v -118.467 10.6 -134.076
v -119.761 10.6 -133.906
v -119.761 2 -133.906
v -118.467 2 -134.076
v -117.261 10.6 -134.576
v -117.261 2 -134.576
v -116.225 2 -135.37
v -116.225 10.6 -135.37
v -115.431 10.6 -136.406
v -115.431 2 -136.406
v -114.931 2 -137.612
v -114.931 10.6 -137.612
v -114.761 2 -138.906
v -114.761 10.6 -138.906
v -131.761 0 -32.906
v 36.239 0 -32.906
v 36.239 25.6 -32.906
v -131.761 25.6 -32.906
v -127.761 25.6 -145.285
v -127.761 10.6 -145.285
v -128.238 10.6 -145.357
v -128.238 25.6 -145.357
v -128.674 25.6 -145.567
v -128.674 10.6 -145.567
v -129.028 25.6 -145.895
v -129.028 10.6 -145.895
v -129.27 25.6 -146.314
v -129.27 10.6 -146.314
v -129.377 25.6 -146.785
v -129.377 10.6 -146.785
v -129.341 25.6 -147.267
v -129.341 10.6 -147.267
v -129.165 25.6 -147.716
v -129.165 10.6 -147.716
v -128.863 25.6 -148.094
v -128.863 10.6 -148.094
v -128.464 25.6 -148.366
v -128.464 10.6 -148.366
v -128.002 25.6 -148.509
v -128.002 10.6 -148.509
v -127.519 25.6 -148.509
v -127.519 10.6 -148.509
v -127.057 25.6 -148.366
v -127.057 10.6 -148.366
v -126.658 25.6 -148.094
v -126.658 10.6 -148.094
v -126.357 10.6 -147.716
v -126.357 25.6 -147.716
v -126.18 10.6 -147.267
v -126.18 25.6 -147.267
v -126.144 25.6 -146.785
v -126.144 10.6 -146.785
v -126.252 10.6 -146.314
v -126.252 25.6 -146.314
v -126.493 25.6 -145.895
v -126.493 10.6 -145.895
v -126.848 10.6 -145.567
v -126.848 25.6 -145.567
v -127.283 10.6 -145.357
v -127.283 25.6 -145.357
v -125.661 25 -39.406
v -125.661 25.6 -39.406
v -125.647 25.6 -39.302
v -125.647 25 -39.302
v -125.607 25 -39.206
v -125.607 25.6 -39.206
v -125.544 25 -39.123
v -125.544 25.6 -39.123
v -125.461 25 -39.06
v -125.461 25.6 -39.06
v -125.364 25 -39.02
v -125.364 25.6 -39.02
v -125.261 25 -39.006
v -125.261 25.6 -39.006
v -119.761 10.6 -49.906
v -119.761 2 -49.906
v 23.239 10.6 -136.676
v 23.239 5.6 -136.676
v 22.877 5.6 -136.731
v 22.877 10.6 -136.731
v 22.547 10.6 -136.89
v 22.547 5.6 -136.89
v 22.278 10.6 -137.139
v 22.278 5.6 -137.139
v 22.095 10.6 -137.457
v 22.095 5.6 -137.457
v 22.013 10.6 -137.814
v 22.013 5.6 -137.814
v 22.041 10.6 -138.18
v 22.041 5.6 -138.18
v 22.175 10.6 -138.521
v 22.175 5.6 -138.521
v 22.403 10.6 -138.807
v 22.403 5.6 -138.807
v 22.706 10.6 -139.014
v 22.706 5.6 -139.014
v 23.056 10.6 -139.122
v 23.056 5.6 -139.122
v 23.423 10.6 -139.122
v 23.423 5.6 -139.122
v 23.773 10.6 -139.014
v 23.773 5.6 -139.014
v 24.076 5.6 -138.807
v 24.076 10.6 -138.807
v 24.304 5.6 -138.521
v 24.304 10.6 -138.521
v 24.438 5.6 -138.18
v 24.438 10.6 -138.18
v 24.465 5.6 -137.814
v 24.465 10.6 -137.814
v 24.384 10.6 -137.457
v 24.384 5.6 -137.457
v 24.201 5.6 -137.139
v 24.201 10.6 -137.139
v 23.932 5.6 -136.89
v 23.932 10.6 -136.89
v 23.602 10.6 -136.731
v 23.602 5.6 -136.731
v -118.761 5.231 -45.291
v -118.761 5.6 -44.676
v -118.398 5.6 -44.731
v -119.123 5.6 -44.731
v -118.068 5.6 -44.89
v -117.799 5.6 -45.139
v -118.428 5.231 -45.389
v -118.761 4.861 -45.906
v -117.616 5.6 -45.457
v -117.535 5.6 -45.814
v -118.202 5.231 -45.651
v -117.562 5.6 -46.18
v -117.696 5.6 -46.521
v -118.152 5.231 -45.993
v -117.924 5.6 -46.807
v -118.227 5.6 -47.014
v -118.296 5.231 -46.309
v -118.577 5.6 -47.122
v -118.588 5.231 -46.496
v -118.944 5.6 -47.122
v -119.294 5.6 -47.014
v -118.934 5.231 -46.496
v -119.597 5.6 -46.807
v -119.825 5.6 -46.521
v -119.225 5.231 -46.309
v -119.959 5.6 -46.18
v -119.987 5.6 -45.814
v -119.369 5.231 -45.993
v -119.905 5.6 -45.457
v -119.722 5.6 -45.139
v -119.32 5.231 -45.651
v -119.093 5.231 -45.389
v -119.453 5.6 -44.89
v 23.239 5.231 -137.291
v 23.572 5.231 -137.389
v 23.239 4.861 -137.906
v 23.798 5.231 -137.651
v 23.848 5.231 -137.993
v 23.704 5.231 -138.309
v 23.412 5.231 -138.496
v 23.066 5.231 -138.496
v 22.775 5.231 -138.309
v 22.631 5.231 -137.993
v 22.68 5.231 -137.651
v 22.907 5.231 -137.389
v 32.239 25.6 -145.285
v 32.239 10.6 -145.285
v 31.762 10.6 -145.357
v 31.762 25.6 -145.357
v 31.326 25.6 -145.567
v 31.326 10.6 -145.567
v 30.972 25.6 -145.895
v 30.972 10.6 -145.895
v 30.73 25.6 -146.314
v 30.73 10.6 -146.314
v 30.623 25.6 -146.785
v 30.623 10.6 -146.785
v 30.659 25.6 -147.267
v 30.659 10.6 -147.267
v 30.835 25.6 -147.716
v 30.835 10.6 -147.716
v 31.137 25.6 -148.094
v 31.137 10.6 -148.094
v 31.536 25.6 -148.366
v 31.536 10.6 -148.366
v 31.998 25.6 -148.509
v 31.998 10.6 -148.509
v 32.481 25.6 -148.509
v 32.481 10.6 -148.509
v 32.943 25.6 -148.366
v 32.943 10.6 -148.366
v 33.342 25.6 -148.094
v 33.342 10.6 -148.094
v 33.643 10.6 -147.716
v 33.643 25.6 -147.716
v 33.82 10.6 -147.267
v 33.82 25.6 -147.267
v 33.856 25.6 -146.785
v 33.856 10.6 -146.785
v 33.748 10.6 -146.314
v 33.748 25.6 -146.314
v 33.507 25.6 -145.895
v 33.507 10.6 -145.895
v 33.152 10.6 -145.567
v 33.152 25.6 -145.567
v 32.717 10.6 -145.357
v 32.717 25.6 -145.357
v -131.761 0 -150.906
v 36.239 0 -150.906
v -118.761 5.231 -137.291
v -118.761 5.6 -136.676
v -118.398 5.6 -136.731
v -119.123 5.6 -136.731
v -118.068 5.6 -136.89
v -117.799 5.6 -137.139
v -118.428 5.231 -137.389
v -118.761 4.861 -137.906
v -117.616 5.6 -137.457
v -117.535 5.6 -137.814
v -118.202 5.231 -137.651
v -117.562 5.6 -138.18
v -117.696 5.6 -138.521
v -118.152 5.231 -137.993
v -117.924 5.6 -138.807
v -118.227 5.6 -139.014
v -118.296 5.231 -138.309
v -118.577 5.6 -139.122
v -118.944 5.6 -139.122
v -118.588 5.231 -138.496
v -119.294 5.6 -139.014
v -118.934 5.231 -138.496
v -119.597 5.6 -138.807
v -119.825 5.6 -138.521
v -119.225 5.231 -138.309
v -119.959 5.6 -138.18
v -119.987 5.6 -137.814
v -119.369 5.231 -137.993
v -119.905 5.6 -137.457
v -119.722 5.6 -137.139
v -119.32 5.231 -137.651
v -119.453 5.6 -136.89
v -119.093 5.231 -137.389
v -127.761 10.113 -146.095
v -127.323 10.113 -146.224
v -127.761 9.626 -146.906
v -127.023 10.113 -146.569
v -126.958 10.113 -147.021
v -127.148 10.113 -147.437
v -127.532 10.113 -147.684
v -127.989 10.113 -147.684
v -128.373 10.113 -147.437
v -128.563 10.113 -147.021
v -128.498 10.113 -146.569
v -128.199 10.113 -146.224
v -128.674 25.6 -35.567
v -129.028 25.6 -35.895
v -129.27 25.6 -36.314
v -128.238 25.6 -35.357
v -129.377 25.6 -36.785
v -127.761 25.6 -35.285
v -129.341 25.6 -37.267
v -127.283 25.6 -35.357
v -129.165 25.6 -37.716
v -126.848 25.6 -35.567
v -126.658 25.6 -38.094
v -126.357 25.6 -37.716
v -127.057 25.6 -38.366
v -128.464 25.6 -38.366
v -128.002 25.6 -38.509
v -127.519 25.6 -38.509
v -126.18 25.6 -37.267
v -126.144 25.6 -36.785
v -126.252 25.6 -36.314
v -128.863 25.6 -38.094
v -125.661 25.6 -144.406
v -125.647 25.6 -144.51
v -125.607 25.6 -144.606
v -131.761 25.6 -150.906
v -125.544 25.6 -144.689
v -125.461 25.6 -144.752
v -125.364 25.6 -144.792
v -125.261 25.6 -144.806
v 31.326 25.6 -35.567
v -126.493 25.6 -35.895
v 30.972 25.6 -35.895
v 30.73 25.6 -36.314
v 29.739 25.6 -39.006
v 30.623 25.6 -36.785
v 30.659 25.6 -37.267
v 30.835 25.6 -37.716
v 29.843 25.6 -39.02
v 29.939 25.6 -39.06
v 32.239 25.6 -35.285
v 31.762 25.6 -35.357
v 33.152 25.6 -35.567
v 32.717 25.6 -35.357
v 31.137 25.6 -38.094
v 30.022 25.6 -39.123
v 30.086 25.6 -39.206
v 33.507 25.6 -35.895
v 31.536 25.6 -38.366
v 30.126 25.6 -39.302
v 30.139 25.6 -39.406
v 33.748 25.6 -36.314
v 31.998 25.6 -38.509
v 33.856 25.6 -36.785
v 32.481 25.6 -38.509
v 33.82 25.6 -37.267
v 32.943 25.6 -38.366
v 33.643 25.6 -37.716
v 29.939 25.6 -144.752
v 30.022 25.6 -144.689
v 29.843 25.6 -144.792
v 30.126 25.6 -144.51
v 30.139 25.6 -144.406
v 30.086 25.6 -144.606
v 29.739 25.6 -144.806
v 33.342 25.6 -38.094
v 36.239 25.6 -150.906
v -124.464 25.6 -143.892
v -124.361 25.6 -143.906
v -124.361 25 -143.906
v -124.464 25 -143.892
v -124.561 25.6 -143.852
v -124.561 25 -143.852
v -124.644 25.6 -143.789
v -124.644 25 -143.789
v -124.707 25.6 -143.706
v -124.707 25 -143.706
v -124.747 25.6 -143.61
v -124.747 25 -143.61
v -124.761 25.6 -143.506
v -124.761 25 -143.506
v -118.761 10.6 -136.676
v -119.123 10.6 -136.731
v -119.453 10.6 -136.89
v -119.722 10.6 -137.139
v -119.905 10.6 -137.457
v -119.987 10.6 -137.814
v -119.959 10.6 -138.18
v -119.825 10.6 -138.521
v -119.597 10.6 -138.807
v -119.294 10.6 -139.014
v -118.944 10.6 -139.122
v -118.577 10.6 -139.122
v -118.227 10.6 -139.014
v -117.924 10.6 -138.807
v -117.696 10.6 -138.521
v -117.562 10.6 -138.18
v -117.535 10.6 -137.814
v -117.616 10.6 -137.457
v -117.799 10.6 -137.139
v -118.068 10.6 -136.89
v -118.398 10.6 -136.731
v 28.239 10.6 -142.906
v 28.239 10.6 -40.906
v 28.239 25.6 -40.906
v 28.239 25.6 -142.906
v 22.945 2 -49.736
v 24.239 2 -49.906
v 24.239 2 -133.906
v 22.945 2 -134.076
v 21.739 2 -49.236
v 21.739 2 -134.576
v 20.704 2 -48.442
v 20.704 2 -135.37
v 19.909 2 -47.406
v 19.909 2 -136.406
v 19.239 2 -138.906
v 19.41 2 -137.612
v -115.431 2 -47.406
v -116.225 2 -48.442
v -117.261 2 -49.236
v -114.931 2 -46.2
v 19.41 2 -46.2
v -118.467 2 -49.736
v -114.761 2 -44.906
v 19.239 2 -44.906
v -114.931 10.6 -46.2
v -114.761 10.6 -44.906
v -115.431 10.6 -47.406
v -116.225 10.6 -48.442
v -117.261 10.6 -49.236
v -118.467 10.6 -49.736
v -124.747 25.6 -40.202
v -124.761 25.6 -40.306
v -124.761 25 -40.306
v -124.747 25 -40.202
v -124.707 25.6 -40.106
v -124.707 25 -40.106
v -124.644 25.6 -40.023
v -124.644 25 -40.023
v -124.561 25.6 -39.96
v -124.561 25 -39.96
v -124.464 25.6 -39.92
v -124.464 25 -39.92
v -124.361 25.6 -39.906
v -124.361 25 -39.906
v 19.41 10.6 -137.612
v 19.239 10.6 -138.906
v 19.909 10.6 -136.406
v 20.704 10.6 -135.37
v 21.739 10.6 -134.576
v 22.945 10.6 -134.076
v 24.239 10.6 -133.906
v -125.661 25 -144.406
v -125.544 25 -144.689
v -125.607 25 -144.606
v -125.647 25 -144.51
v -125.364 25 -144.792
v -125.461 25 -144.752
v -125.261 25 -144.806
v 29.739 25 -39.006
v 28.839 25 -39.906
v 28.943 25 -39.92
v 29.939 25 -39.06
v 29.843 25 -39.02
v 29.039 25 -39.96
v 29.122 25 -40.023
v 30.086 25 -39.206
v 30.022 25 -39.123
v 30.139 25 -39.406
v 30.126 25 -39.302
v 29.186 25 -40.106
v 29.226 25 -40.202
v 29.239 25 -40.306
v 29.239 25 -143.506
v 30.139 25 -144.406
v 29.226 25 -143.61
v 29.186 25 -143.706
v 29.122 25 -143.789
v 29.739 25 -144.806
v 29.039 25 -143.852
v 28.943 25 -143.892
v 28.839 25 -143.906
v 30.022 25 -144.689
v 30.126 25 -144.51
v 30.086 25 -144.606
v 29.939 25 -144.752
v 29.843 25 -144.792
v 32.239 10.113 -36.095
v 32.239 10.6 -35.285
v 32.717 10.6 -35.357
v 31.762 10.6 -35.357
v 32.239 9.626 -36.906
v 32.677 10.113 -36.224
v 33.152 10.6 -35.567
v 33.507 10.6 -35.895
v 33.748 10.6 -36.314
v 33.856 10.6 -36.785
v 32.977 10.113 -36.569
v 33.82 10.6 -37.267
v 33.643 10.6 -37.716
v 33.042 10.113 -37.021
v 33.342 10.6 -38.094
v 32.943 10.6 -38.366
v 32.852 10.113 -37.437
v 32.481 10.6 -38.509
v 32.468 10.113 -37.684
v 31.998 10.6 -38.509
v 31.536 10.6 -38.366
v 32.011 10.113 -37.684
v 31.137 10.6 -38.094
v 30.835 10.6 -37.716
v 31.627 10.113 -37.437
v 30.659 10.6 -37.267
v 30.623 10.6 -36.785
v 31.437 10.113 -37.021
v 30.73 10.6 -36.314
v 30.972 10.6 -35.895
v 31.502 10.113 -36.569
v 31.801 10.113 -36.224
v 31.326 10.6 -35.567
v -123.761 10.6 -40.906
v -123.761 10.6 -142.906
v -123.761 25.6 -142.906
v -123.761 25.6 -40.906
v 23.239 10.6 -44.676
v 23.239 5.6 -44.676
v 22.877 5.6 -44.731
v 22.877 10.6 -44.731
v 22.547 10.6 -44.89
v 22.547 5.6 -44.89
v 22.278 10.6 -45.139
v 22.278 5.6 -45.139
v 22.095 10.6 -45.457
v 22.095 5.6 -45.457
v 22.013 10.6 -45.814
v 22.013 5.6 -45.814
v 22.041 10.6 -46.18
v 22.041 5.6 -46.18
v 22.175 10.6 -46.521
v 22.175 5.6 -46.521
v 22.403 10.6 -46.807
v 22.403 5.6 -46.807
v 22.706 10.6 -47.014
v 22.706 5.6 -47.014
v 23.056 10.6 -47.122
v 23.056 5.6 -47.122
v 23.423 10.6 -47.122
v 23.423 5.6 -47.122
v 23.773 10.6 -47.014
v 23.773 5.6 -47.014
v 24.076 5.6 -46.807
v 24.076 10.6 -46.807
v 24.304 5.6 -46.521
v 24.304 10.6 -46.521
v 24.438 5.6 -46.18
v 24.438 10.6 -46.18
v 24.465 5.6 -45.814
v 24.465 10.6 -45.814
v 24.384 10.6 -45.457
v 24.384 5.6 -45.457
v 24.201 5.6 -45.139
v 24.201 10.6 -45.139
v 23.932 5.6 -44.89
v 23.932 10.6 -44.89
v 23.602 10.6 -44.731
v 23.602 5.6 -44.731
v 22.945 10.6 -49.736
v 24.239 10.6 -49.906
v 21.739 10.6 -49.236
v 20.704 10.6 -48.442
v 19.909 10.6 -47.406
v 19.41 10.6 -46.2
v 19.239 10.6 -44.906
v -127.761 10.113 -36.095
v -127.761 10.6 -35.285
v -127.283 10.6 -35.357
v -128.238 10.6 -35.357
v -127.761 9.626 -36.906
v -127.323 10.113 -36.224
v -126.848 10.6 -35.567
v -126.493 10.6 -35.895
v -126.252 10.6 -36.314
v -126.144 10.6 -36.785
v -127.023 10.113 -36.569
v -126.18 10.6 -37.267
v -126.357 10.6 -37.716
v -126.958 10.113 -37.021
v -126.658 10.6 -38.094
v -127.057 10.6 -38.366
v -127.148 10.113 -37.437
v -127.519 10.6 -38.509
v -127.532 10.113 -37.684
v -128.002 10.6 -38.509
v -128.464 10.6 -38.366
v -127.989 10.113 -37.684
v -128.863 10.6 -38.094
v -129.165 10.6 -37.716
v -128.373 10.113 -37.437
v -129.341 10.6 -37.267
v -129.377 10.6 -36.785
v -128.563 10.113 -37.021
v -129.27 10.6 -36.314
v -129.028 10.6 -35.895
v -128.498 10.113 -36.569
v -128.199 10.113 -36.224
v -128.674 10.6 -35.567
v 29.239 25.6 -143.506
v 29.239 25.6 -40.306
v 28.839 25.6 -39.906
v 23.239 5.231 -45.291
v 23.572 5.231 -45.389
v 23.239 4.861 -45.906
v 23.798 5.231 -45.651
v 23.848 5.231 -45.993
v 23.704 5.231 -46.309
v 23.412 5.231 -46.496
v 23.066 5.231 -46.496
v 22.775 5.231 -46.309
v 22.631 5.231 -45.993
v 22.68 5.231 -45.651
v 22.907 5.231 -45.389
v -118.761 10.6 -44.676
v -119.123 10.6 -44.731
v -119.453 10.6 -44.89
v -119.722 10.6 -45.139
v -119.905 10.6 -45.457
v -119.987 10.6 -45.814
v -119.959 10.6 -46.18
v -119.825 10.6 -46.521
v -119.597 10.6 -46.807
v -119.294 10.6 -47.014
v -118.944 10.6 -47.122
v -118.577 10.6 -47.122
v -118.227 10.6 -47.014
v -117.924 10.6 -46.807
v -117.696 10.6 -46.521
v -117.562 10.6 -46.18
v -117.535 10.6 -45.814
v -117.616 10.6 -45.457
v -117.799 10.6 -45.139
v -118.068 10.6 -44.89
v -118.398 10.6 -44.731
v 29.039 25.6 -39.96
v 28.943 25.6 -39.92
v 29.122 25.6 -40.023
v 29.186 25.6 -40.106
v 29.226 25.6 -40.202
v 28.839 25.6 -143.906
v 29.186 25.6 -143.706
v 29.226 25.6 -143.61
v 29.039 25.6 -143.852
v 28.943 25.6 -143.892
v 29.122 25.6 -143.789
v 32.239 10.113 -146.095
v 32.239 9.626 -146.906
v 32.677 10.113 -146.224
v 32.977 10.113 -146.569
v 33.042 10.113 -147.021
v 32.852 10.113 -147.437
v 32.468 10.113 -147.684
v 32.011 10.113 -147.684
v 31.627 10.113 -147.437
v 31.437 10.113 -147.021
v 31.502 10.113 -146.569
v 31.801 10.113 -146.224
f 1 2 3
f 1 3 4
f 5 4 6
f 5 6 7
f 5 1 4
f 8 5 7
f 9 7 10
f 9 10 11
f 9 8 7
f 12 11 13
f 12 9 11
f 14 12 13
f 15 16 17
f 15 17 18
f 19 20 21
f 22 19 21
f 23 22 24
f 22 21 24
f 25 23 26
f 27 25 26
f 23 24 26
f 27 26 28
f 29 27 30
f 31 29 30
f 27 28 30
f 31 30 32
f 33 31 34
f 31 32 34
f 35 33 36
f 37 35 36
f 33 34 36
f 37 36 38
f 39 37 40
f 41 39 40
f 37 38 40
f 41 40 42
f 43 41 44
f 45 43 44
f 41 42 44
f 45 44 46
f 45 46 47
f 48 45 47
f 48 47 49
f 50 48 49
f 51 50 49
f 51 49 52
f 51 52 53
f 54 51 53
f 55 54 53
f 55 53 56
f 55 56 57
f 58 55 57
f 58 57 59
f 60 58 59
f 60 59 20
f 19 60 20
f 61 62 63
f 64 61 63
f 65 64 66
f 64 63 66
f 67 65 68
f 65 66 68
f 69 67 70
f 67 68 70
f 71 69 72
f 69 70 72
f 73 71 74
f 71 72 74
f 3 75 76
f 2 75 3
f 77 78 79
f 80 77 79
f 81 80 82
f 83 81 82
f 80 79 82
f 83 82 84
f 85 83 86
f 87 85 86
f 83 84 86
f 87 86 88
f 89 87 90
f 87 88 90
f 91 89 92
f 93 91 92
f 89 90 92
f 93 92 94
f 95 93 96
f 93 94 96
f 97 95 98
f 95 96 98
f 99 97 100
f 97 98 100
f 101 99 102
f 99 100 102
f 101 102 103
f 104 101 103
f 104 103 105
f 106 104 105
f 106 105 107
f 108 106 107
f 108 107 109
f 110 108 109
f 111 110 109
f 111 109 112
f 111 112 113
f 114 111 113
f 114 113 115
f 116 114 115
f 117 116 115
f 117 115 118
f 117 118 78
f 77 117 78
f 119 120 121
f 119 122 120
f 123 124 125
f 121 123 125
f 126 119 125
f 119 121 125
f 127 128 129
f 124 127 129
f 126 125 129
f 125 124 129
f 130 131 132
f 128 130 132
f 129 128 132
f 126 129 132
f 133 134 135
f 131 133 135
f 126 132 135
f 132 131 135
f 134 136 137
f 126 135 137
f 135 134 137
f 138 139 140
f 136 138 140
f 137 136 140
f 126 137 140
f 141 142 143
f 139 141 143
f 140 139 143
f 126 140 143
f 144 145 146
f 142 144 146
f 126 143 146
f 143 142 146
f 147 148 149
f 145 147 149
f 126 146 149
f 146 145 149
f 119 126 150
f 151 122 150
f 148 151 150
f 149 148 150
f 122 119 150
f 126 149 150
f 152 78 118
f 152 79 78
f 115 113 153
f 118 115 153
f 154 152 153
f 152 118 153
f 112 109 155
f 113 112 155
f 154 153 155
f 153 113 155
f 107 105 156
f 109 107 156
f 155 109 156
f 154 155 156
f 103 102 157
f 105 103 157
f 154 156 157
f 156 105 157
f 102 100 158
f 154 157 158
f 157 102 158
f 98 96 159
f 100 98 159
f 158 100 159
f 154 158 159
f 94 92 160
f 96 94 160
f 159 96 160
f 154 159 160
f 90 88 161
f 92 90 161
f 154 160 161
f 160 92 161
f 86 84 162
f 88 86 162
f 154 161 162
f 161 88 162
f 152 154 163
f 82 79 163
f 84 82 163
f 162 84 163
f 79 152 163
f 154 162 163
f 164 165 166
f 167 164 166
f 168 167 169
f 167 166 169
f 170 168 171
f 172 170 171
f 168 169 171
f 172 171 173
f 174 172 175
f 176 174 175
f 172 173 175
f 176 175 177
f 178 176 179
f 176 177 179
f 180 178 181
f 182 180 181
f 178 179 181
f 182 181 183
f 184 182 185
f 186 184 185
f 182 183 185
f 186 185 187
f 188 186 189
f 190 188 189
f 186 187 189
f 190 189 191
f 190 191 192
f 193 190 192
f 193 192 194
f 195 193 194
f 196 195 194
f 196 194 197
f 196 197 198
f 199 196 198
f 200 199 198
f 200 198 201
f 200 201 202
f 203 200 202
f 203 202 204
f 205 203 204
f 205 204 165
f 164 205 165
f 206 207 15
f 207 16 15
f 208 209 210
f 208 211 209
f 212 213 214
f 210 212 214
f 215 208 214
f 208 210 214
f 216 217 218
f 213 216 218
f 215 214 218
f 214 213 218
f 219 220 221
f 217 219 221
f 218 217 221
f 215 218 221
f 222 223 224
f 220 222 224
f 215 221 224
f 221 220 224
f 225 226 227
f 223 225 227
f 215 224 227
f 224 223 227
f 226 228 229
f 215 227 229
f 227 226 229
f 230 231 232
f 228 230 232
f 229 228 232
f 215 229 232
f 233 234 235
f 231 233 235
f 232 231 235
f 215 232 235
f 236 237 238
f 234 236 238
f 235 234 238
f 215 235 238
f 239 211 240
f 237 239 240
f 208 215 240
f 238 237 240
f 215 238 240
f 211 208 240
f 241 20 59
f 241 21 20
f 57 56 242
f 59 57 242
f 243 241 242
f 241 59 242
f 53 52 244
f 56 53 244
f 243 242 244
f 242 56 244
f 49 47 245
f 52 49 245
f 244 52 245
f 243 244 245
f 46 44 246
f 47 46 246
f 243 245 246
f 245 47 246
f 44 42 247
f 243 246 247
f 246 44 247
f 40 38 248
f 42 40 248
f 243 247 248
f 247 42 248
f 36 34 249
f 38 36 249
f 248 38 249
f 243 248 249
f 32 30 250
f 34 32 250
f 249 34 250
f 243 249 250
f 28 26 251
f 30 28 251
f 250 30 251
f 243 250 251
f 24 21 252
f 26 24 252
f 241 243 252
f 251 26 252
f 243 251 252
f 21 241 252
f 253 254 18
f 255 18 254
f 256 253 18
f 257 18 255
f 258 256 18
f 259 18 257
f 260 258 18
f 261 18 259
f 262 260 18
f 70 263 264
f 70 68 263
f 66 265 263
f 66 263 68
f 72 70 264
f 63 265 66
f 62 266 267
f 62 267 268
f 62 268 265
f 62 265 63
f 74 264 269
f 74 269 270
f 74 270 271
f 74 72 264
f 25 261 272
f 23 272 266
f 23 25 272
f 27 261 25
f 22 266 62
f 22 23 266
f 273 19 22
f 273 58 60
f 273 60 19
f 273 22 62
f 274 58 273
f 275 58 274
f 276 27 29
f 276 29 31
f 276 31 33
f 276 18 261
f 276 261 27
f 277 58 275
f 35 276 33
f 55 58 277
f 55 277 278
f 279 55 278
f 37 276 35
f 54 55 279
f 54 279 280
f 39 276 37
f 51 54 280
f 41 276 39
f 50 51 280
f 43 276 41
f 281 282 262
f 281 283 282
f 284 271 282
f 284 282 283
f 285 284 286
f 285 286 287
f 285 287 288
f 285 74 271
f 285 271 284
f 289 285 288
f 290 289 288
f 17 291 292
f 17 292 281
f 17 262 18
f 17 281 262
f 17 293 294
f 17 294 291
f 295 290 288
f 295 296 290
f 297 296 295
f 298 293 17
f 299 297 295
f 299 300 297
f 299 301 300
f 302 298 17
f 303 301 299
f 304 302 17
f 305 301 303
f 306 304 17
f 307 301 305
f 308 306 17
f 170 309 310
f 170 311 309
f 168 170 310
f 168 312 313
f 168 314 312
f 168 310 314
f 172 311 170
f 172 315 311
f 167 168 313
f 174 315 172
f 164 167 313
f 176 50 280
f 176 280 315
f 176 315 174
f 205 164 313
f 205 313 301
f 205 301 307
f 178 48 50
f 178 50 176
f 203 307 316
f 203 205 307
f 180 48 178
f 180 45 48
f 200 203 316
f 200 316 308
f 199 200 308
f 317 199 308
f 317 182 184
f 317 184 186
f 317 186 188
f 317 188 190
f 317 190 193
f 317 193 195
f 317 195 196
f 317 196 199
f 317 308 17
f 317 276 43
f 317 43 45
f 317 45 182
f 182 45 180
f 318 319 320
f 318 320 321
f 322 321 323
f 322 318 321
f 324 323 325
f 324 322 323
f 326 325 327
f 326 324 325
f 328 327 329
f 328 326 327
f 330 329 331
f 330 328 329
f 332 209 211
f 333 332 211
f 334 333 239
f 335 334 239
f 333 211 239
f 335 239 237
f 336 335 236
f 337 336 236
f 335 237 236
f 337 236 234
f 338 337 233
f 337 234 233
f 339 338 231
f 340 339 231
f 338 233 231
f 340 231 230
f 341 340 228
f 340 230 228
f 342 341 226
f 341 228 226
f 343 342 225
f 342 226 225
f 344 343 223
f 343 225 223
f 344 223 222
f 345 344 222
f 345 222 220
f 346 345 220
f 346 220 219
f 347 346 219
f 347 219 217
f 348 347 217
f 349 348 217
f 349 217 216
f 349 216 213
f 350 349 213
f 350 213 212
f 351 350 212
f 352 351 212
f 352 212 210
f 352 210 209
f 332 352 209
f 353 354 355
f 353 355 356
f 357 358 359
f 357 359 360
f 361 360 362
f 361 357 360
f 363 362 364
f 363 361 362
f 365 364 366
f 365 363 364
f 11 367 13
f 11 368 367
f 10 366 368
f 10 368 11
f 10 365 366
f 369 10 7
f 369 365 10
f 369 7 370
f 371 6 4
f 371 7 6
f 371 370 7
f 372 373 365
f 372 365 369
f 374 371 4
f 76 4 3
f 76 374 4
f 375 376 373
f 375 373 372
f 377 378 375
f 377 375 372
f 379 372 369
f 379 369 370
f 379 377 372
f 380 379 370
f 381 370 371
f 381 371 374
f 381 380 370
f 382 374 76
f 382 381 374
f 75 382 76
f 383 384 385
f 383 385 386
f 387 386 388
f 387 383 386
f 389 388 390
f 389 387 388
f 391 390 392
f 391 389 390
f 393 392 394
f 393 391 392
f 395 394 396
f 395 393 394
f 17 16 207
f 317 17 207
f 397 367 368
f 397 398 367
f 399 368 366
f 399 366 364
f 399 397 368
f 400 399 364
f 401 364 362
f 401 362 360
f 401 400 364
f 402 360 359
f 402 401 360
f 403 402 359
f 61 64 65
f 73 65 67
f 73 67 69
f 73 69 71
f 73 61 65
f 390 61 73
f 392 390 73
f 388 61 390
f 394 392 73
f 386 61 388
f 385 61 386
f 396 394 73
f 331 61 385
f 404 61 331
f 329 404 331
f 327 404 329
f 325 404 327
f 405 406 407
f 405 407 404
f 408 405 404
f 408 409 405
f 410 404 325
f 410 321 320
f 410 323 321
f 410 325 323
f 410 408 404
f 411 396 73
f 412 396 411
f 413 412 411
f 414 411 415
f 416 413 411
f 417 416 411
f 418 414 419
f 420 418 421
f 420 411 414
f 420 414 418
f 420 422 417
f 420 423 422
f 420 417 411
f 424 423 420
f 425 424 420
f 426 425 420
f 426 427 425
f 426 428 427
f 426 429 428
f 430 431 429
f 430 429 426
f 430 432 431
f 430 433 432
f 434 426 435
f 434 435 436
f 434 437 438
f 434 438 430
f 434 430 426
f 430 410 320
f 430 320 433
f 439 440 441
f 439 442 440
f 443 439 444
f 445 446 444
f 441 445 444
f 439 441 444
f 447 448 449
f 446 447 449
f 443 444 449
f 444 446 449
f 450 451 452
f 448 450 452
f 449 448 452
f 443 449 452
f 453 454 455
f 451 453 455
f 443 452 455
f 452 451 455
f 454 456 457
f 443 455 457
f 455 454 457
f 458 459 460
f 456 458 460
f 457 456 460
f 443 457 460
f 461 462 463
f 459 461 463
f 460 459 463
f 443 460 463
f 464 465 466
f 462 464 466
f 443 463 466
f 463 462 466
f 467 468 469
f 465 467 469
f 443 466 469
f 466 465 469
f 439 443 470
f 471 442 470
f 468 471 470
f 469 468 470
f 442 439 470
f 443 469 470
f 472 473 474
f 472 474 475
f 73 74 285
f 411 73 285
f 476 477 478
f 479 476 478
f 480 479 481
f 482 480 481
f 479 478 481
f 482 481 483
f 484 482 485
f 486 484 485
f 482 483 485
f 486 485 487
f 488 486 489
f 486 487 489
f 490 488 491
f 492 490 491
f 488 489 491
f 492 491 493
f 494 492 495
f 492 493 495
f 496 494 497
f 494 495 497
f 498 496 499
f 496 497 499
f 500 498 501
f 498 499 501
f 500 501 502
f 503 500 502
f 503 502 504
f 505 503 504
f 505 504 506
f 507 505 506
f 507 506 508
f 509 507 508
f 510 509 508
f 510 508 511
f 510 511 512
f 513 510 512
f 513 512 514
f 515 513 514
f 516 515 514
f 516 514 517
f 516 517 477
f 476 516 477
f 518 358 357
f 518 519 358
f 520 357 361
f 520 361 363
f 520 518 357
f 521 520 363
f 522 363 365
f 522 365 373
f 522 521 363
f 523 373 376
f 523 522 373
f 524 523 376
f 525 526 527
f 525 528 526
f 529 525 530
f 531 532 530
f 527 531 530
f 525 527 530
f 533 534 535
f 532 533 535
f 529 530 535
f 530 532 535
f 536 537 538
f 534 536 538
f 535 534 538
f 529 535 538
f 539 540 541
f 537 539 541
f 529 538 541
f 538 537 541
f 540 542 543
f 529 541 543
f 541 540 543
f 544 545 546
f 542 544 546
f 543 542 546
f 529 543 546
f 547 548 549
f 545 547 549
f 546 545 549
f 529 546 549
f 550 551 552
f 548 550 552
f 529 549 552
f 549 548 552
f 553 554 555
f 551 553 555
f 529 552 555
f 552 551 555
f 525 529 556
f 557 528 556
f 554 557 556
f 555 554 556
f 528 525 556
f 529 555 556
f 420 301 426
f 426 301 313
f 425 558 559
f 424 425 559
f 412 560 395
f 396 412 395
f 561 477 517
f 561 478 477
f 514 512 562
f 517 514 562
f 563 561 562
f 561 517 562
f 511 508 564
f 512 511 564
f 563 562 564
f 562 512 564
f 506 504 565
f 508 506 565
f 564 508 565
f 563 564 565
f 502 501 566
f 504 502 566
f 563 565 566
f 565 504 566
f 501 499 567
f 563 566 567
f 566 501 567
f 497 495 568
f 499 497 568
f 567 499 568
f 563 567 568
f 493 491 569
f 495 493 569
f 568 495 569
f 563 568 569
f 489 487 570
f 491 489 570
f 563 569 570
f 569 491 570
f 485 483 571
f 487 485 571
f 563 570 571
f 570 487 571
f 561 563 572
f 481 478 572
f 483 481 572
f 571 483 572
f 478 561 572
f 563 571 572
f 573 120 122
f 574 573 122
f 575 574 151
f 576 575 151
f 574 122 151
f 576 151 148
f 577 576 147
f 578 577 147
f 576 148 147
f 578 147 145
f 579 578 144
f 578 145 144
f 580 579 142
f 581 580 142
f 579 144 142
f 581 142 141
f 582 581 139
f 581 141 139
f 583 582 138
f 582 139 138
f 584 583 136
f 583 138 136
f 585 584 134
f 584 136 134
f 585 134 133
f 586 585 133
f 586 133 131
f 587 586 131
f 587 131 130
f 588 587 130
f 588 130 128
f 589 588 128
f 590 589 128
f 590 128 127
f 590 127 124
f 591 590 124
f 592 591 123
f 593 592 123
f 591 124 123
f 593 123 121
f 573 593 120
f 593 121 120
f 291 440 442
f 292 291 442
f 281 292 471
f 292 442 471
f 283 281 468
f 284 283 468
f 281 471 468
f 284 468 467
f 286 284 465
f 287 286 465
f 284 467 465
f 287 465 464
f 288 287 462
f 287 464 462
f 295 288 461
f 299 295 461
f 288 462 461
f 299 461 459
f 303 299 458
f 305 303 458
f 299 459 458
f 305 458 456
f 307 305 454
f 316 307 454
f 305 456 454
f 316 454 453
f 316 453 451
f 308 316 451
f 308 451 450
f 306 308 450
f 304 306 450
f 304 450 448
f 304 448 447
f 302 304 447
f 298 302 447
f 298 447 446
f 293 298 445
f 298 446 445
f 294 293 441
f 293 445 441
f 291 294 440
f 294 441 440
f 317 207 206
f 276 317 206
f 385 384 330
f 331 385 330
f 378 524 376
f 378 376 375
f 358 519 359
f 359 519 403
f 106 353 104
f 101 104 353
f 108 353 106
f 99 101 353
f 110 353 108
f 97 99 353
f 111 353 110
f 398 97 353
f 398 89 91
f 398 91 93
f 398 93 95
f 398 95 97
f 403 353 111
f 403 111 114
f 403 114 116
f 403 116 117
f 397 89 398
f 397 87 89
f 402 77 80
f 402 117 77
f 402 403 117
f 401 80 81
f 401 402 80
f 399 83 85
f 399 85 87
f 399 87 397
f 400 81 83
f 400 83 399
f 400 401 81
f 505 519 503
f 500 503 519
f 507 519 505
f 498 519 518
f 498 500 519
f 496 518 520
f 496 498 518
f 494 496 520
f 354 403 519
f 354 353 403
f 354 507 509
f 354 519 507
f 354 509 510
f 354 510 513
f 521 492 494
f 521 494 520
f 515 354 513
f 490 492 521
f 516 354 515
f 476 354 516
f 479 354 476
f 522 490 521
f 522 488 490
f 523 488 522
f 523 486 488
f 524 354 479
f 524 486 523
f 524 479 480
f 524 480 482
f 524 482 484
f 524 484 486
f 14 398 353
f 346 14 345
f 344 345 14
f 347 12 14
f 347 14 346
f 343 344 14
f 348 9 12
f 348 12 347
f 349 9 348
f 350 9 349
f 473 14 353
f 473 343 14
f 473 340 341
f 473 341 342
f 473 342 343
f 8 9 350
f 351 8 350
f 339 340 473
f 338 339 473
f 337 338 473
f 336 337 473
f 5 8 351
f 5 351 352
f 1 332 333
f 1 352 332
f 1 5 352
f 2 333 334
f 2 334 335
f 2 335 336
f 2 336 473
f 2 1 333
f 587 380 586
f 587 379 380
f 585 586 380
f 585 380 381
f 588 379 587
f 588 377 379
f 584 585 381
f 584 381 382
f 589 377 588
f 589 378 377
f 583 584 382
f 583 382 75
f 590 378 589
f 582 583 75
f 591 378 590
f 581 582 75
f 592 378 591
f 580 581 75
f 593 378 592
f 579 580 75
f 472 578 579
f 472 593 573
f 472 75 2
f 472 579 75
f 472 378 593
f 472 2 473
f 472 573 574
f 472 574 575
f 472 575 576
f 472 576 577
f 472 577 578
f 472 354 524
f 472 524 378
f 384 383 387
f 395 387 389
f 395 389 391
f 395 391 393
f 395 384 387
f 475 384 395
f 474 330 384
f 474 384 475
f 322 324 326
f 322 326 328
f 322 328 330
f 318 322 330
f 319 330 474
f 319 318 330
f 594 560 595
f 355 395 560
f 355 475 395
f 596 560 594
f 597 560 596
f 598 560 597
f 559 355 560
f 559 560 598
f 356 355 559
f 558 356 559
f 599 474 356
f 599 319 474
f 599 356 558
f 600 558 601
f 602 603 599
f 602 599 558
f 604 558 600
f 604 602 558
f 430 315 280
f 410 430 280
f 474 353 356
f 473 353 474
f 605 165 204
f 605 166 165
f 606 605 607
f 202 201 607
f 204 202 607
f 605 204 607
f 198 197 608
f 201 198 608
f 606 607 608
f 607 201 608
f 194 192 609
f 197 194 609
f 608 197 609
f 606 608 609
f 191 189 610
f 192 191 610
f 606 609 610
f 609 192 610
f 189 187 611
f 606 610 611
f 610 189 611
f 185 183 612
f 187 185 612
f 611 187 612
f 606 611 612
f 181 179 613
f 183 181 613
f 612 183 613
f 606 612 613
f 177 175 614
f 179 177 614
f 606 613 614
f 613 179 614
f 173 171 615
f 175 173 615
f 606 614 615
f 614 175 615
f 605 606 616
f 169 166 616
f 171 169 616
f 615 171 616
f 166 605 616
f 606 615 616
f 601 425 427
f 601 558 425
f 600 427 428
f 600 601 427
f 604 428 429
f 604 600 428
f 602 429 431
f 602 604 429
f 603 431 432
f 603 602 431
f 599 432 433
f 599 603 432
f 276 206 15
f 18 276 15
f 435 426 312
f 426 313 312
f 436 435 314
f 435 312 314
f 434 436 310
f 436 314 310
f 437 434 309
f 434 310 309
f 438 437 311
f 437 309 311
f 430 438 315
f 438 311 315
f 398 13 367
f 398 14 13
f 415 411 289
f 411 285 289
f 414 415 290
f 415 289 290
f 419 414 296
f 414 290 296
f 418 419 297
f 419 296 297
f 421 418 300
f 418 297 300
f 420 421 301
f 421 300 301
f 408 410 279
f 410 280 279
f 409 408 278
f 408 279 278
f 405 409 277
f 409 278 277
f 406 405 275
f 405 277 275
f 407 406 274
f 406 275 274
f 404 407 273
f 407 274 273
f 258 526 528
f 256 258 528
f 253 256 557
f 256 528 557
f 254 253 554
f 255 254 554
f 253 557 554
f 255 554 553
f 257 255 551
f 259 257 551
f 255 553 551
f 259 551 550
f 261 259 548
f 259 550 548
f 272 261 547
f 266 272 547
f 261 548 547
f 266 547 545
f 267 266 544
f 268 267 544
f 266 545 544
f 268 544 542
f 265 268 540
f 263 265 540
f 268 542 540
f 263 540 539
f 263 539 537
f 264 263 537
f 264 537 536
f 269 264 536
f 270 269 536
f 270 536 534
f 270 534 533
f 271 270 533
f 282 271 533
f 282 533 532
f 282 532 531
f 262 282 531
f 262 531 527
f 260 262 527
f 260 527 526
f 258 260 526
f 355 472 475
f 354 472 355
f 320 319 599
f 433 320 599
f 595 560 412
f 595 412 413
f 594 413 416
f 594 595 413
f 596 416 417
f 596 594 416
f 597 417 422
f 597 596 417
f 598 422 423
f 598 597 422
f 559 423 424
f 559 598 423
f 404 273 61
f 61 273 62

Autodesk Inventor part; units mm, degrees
ref_plane "YZ Plane" through (0, 0, 0) normal (1, 0, 0) x (0, 1, 0)
ref_plane "XZ Plane" through (0, 0, 0) normal (0, 1, 0) x (-1, 0, 0)
ref_plane "XY Plane" through (0, 0, 0) normal (0, 0, 1) x (1, 0, 0)
sketch "Esboço9" plane through (0, 0, 0) normal (0, 1, 0) x (-1, 0, 0)
  line L0 (123.7607, -142.906) -> (-28.2393, -142.906)
  line L1 (-28.2393, -142.906) -> (-28.2393, -40.906)
  line L2 (-28.2393, -40.906) -> (123.7607, -40.906)
  line L3 (123.7607, -40.906) -> (123.7607, -142.906)
  point P0 (0, 0)
  dimension "d42" = 152
  dimension "d43" = 102
extrude "Extrusão7" add sketch "Esboço9" along normal blind 10.6
shell "Casca2" thickness 2 removed faces 1 at (-22.4273, 10.6, -74.906)
sketch "Esboço10" plane through (0, 10.6, 0) normal (0, 1, 0) x (1, 0, 0)
  line L0 (-123.7607, 142.906) -> (-123.7607, 40.906) projected
  line L1 (-123.7607, 40.906) -> (28.2393, 40.906) projected
  line L2 (28.2393, 142.906) -> (-123.7607, 142.906) projected
  line L3 (28.2393, 40.906) -> (28.2393, 142.906) projected
  line L4 (-123.7607, 40.906) -> (-131.7607, 40.906)
  line L5 (-131.7607, 40.906) -> (-131.7607, 142.906)
  line L6 (-131.7607, 142.906) -> (-123.7607, 142.906)
  line L7 (-123.7607, 142.906) -> (-123.7607, 40.906)
  line L8 (-131.7607, 142.906) -> (28.2393, 142.906)
  line L9 (28.2393, 142.906) -> (28.2393, 150.906)
  line L10 (28.2393, 150.906) -> (-131.7607, 150.906)
  line L11 (-131.7607, 150.906) -> (-131.7607, 142.906)
  line L12 (28.2393, 40.906) -> (36.2393, 40.906)
  line L13 (36.2393, 40.906) -> (36.2393, 150.906)
  line L14 (36.2393, 150.906) -> (28.2393, 150.906)
  line L15 (28.2393, 150.906) -> (28.2393, 40.906)
  line L16 (-131.7607, 40.906) -> (36.2393, 40.906)
  line L17 (36.2393, 40.906) -> (36.2393, 32.906)
  line L18 (36.2393, 32.906) -> (-131.7607, 32.906)
  line L19 (-131.7607, 32.906) -> (-131.7607, 40.906)
  point P0 (0, 0)
  dimension "d47" = 8
  dimension "d48" = 8
  dimension "d49" = 8
  dimension "d50" = 8
extrude "Extrusão8" add sketch "Esboço10" along normal blind 15 and the other way blind 10.6 contours L6 L11 L10 L9 L2 | L0 L4 L5 L6 | L1 L12 L17 L18 L19 L4 | L9 L14 L13 L12 L3
sketch "Esboço11" plane through (0, 10.6, 0) normal (0, 1, 0) x (1, 0, 0)
  line L0 (-121.7607, 42.906) -> (-121.7607, 140.906) projected
  line L1 (26.2393, 42.906) -> (-121.7607, 42.906) projected
  line L2 (-121.7607, 140.906) -> (26.2393, 140.906) projected
  line L3 (26.2393, 140.906) -> (26.2393, 42.906) projected
  line L4 (-121.7607, 42.906) -> (-119.7607, 42.906)
  line L5 (-119.7607, 42.906) -> (-119.7607, 140.906)
  line L6 (-119.7607, 140.906) -> (-121.7607, 140.906)
  line L7 (-121.7607, 140.906) -> (-121.7607, 42.906)
  line L8 (26.2393, 140.906) -> (-121.7607, 140.906)
  line L9 (-121.7607, 140.906) -> (-121.7607, 138.906)
  line L10 (-121.7607, 138.906) -> (26.2393, 138.906)
  line L11 (26.2393, 138.906) -> (26.2393, 140.906)
  line L12 (-121.7607, 42.906) -> (26.2393, 42.906)
  line L13 (26.2393, 42.906) -> (26.2393, 44.906)
  line L14 (26.2393, 44.906) -> (-121.7607, 44.906)
  line L15 (-121.7607, 44.906) -> (-121.7607, 42.906)
  line L16 (26.2393, 42.906) -> (24.2393, 42.906)
  line L17 (24.2393, 42.906) -> (24.2393, 140.906)
  line L18 (24.2393, 140.906) -> (26.2393, 140.906)
  line L19 (26.2393, 140.906) -> (26.2393, 42.906)
  point P0 (0, 0)
  point P1 (-119.7607, 138.906)
  point P2 (24.2393, 138.906)
  point P3 (24.2393, 44.906)
  point P4 (-119.7607, 44.906)
  dimension "d55" = 2
  dimension "d56" = 2
  dimension "d57" = 2
  dimension "d58" = 2
extrude "Extrusão9" add sketch "Esboço11" against normal blind 8.6 contours L0 L14 L5 L1 | L0 L10 L5 L14 | L5 L14 L17 L1 | L0 L2 L5 L10 | L17 L14 L3 L1 | L5 L2 L17 L10 | L17 L10 L3 L14 | L17 L2 L3 L10
sketch "Esboço12" plane through (0, 10.6, 0) normal (0, 1, 0) x (1, 0, 0)
  line L0 (24.2393, 138.906) -> (24.2393, 44.906) projected
  line L1 (24.2393, 44.906) -> (-119.7607, 44.906) projected
  line L2 (-119.7607, 138.906) -> (24.2393, 138.906) projected
  line L3 (-119.7607, 44.906) -> (-119.7607, 138.906) projected
  arc A0 (19.2393, 138.906) -> (24.2393, 133.906) centre (24.2393, 138.906) ccw
  arc A1 (24.2393, 49.906) -> (19.2393, 44.906) centre (24.2393, 44.906) ccw
  arc A2 (-114.7607, 44.906) -> (-119.7607, 49.906) centre (-119.7607, 44.906) ccw
  arc A3 (-119.7607, 133.906) -> (-114.7607, 138.906) centre (-119.7607, 138.906) ccw
  point P0 (0, 0)
  dimension "d61" = 5
  dimension "d62" = 5
  dimension "d63" = 5
  dimension "d64" = 5
extrude "Extrusão10" add sketch "Esboço12" against normal blind 8.6 contours L0 A0 L2 | L0 L1 A1 | A3 L3 L2 | L1 L3 A2
sketch "Esboço13" plane through (0, 10.6, 0) normal (0, 1, 0) x (1, 0, 0)
  line L0 (28.2393, 40.906) -> (28.2393, 142.906) projected
  line L1 (-123.7607, 40.906) -> (28.2393, 40.906) projected
  point P0 (0, 0)
  point P1 (23.2393, 45.906)
  dimension "d67" = 5
  dimension "d68" = 5
hole "Furo2" at (23.2393, 10.6, -45.906) direction (0, -1, 0) diameter 2.459 depth 5 tip angle 118 thread size "M3x0.5" class "6H" standard "ISO Metric profile"
sketch "Esboço14" plane through (0, 10.6, 0) normal (0, 1, 0) x (1, 0, 0)
  line L0 (28.2393, 40.906) -> (28.2393, 142.906) projected
  line L1 (28.2393, 142.906) -> (-123.7607, 142.906) projected
  point P0 (0, 0)
  point P1 (23.2393, 137.906)
  dimension "d76" = 5
  dimension "d77" = 5
hole "Furo3" at (23.2393, 10.6, -137.906) direction (0, -1, 0) diameter 2.459 depth 5 tip angle 118 thread size "M3x0.5" class "6H" standard "ISO Metric profile"
sketch "Esboço15" plane through (0, 10.6, 0) normal (0, 1, 0) x (1, 0, 0)
  line L0 (28.2393, 142.906) -> (-123.7607, 142.906) projected
  line L1 (-123.7607, 142.906) -> (-123.7607, 40.906) projected
  point P0 (0, 0)
  point P1 (-118.7607, 137.906)
  dimension "d85" = 5
  dimension "d86" = 5
hole "Furo4" at (-118.7607, 10.6, -137.906) direction (0, -1, 0) diameter 2.459 depth 5 tip angle 118 thread size "M3x0.5" class "6H" standard "ISO Metric profile"
sketch "Esboço16" plane through (0, 10.6, 0) normal (0, 1, 0) x (1, 0, 0)
  line L0 (-123.7607, 142.906) -> (-123.7607, 40.906) projected
  line L1 (-123.7607, 40.906) -> (28.2393, 40.906) projected
  point P0 (0, 0)
  point P1 (-118.7607, 45.906)
  dimension "d94" = 5
  dimension "d95" = 5
hole "Furo5" at (-118.7607, 10.6, -45.906) direction (0, -1, 0) diameter 2.459 depth 5 tip angle 118 thread size "M3x0.5" class "6H" standard "ISO Metric profile"
sketch "Esboço18" plane through (0, 25.6, 0) normal (0, 1, 0) x (1, 0, 0)
  point P0 (0, 0)
sketch "Esboço19" plane through (0, 25.6, 0) normal (0, 1, 0) x (1, 0, 0)
  point P0 (0, 0)
sketch "Esboço20" plane through (0, 25.6, 0) normal (0, 1, 0) x (1, 0, 0)
  line L0 (-131.7607, 32.906) -> (36.2393, 32.906) projected
  line L1 (-131.7607, 150.906) -> (-131.7607, 32.906) projected
  point P0 (0, 0)
  point P1 (-127.7607, 36.906)
  dimension "d104" = 4
  dimension "d105" = 4
hole "Furo6" at (-127.7607, 25.6, -36.906) direction (0, -1, 0) diameter 3.242 depth 15 tip angle 118 thread size "M4x0.7" class "6H" standard "ISO Metric profile"
sketch "Esboço21" plane through (0, 25.6, 0) normal (0, 1, 0) x (1, 0, 0)
  line L0 (28.2393, 142.906) -> (28.2393, 40.906) projected
  line L1 (-124.3607, 143.906) -> (28.8393, 143.906)
  line L2 (29.2393, 143.506) -> (29.2393, 40.306)
  line L3 (28.8393, 39.906) -> (-124.3607, 39.906)
  line L4 (-124.7607, 40.306) -> (-124.7607, 143.506)
  line L5 (-125.2607, 39.006) -> (29.7393, 39.006)
  line L6 (30.1393, 39.406) -> (30.1393, 144.406)
  line L7 (29.7393, 144.806) -> (-125.2607, 144.806)
  line L8 (-125.6607, 144.406) -> (-125.6607, 39.406)
  arc A0 (-125.6607, 39.406) -> (-125.2607, 39.006) centre (-125.2607, 39.406) ccw
  arc A1 (-124.7607, 40.306) -> (-124.3607, 39.906) centre (-124.3607, 40.306) ccw
  arc A2 (-124.3607, 143.906) -> (-124.7607, 143.506) centre (-124.3607, 143.506) ccw
  arc A3 (-125.2607, 144.806) -> (-125.6607, 144.406) centre (-125.2607, 144.406) ccw
  arc A4 (28.8393, 39.906) -> (29.2393, 40.306) centre (28.8393, 40.306) ccw
  arc A5 (29.7393, 39.006) -> (30.1393, 39.406) centre (29.7393, 39.406) ccw
  arc A6 (29.2393, 143.506) -> (28.8393, 143.906) centre (28.8393, 143.506) ccw
  arc A7 (30.1393, 144.406) -> (29.7393, 144.806) centre (29.7393, 144.406) ccw
  point P0 (0, 0)
  point P1 (-123.7607, 40.906)
  dimension "d117" = 0.9
  dimension "d118" = 0.4
extrude "Extrusão11" cut sketch "Esboço21" against normal blind 0.6
sketch "Esboço22" plane through (0, 25.6, 0) normal (0, 1, 0) x (1, 0, 0)
  line L0 (-131.7607, 150.906) -> (-131.7607, 32.906) projected
  line L1 (36.2393, 150.906) -> (-131.7607, 150.906) projected
  line L2 (36.2393, 32.906) -> (36.2393, 150.906) projected
  line L3 (-131.7607, 32.906) -> (36.2393, 32.906) projected
  point P0 (0, 0)
  point P1 (-127.7607, 146.906)
  point P2 (32.2393, 146.906)
  point P3 (32.2393, 36.906)
  dimension "d121" = 4
  dimension "d122" = 4
  dimension "d123" = 4
  dimension "d124" = 4
  dimension "d125" = 4
  dimension "d126" = 4
hole "Furo7" at (-127.7607, 25.6, -146.906) at (32.2393, 25.6, -146.906) at (32.2393, 25.6, -36.906) direction (0, -1, 0) diameter 3.242 depth 15 tip angle 118 thread size "M4x0.7" class "6H" standard "ISO Metric profile"
properties part number "peça pi2"
